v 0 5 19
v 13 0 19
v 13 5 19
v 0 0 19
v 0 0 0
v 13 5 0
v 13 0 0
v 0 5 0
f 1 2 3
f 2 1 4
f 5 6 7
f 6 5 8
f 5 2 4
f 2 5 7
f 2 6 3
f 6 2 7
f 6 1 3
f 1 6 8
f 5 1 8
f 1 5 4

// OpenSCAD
// Generated by SolidPython 1.0.1 on 2020-07-29 00:46:55


cube(size = [13, 5, 19]);
/***********************************************
*********      SolidPython code:      **********
************************************************
 
# import packages: SolidPython
from solid import *
from solid.utils import *
from itertools import chain, combinations, permutations


class Resize:

    def __init__(self, scad_file):
        self.scad_file = scad_file
        #self.scad_file = import_scad(scad_file)
        # cone/cylinder param:
        self.r1 = 0
        self.r2 = 0
        self.h = 0
        # rectangular prism param:
        self.w = 0
        self.l = 0
        # ellipse param:
        self.r = 0

    # import OpenScad code (file name corresponds to shape)


    # classify shape + parameters
    def assign(self, param1, param2, param3):
        if self.scad_file == 'cone.scad':
            self.r1 = param1
            self.r2 = param2
            self.h = param3
        elif self.scad_file == 'cylinder.scad':
            self.r1 = param1
            self.r2 = param2
            self.h = param3
        elif self.scad_file == 'rectangularPrism.scad':
            self.h = param1
            self.l = param2
            self.w = param3
        else:
            self.r = param1
            self.h = param2

    # resize parameters
    def iterate(self):
        x = range(3, 20, 2)
        i = 1
        if self.scad_file == 'cone.scad':
            tempList = list(permutations(x, 2))
            for temp in tempList:
                param1 = temp[0]
                param2 = temp[1]
                filepath = 'produced_scad_files/' + 'cone' + str(param1) + '_' + str(param2) + '_' + '.scad'
                scad_render_to_file(cylinder(h=param1, r1=param2, r2=0), filepath)

        elif self.scad_file == 'cylinder.scad':
            tempList = list(permutations(x, 3))
            for temp in tempList:
                param1 = temp[0]
                param2 = temp[1]
                filepath = 'produced_scad_files/' + 'cylinder' + str(param1) + '_' + str(param2) + '_' + '.scad'
                scad_render_to_file(cylinder(h=param1, r1=param2, r2=param2), filepath)

        elif self.scad_file == 'rectangularPrism.scad':
            tempList = list(permutations(x, 3))
            for temp in tempList:
                param1 = temp[0]
                param2 = temp[1]
                param3 = temp[2]
                filepath = 'produced_scad_files/' + 'rectangularPrism' + str(param1) + '_' + str(param2) + '_' + str(
                    param3) + '.scad'
                scad_render_to_file(cube(size=(param1, param2, param3)), filepath)

        elif self.scad_file == 'ellipse.scad':
            tempList = list(permutations(x, 4))
            for temp in tempList:
                param1 = temp[0]
                param2 = temp[1]
                param3 = temp[2]
                param4 = temp[3]
                filepath = 'produced_scad_files/' + 'ellipse' + str(param1) + '_' + str(param2) + '_' + str(param3) + '_' + str(param4) + '.scad'
                scad_render_to_file(scale([param1, param2, param3])(sphere(r=param4)), filepath)

    def render_to_scadfile(self):
        scad_render_to_file(scad, 'example.scad') 
 
************************************************/
